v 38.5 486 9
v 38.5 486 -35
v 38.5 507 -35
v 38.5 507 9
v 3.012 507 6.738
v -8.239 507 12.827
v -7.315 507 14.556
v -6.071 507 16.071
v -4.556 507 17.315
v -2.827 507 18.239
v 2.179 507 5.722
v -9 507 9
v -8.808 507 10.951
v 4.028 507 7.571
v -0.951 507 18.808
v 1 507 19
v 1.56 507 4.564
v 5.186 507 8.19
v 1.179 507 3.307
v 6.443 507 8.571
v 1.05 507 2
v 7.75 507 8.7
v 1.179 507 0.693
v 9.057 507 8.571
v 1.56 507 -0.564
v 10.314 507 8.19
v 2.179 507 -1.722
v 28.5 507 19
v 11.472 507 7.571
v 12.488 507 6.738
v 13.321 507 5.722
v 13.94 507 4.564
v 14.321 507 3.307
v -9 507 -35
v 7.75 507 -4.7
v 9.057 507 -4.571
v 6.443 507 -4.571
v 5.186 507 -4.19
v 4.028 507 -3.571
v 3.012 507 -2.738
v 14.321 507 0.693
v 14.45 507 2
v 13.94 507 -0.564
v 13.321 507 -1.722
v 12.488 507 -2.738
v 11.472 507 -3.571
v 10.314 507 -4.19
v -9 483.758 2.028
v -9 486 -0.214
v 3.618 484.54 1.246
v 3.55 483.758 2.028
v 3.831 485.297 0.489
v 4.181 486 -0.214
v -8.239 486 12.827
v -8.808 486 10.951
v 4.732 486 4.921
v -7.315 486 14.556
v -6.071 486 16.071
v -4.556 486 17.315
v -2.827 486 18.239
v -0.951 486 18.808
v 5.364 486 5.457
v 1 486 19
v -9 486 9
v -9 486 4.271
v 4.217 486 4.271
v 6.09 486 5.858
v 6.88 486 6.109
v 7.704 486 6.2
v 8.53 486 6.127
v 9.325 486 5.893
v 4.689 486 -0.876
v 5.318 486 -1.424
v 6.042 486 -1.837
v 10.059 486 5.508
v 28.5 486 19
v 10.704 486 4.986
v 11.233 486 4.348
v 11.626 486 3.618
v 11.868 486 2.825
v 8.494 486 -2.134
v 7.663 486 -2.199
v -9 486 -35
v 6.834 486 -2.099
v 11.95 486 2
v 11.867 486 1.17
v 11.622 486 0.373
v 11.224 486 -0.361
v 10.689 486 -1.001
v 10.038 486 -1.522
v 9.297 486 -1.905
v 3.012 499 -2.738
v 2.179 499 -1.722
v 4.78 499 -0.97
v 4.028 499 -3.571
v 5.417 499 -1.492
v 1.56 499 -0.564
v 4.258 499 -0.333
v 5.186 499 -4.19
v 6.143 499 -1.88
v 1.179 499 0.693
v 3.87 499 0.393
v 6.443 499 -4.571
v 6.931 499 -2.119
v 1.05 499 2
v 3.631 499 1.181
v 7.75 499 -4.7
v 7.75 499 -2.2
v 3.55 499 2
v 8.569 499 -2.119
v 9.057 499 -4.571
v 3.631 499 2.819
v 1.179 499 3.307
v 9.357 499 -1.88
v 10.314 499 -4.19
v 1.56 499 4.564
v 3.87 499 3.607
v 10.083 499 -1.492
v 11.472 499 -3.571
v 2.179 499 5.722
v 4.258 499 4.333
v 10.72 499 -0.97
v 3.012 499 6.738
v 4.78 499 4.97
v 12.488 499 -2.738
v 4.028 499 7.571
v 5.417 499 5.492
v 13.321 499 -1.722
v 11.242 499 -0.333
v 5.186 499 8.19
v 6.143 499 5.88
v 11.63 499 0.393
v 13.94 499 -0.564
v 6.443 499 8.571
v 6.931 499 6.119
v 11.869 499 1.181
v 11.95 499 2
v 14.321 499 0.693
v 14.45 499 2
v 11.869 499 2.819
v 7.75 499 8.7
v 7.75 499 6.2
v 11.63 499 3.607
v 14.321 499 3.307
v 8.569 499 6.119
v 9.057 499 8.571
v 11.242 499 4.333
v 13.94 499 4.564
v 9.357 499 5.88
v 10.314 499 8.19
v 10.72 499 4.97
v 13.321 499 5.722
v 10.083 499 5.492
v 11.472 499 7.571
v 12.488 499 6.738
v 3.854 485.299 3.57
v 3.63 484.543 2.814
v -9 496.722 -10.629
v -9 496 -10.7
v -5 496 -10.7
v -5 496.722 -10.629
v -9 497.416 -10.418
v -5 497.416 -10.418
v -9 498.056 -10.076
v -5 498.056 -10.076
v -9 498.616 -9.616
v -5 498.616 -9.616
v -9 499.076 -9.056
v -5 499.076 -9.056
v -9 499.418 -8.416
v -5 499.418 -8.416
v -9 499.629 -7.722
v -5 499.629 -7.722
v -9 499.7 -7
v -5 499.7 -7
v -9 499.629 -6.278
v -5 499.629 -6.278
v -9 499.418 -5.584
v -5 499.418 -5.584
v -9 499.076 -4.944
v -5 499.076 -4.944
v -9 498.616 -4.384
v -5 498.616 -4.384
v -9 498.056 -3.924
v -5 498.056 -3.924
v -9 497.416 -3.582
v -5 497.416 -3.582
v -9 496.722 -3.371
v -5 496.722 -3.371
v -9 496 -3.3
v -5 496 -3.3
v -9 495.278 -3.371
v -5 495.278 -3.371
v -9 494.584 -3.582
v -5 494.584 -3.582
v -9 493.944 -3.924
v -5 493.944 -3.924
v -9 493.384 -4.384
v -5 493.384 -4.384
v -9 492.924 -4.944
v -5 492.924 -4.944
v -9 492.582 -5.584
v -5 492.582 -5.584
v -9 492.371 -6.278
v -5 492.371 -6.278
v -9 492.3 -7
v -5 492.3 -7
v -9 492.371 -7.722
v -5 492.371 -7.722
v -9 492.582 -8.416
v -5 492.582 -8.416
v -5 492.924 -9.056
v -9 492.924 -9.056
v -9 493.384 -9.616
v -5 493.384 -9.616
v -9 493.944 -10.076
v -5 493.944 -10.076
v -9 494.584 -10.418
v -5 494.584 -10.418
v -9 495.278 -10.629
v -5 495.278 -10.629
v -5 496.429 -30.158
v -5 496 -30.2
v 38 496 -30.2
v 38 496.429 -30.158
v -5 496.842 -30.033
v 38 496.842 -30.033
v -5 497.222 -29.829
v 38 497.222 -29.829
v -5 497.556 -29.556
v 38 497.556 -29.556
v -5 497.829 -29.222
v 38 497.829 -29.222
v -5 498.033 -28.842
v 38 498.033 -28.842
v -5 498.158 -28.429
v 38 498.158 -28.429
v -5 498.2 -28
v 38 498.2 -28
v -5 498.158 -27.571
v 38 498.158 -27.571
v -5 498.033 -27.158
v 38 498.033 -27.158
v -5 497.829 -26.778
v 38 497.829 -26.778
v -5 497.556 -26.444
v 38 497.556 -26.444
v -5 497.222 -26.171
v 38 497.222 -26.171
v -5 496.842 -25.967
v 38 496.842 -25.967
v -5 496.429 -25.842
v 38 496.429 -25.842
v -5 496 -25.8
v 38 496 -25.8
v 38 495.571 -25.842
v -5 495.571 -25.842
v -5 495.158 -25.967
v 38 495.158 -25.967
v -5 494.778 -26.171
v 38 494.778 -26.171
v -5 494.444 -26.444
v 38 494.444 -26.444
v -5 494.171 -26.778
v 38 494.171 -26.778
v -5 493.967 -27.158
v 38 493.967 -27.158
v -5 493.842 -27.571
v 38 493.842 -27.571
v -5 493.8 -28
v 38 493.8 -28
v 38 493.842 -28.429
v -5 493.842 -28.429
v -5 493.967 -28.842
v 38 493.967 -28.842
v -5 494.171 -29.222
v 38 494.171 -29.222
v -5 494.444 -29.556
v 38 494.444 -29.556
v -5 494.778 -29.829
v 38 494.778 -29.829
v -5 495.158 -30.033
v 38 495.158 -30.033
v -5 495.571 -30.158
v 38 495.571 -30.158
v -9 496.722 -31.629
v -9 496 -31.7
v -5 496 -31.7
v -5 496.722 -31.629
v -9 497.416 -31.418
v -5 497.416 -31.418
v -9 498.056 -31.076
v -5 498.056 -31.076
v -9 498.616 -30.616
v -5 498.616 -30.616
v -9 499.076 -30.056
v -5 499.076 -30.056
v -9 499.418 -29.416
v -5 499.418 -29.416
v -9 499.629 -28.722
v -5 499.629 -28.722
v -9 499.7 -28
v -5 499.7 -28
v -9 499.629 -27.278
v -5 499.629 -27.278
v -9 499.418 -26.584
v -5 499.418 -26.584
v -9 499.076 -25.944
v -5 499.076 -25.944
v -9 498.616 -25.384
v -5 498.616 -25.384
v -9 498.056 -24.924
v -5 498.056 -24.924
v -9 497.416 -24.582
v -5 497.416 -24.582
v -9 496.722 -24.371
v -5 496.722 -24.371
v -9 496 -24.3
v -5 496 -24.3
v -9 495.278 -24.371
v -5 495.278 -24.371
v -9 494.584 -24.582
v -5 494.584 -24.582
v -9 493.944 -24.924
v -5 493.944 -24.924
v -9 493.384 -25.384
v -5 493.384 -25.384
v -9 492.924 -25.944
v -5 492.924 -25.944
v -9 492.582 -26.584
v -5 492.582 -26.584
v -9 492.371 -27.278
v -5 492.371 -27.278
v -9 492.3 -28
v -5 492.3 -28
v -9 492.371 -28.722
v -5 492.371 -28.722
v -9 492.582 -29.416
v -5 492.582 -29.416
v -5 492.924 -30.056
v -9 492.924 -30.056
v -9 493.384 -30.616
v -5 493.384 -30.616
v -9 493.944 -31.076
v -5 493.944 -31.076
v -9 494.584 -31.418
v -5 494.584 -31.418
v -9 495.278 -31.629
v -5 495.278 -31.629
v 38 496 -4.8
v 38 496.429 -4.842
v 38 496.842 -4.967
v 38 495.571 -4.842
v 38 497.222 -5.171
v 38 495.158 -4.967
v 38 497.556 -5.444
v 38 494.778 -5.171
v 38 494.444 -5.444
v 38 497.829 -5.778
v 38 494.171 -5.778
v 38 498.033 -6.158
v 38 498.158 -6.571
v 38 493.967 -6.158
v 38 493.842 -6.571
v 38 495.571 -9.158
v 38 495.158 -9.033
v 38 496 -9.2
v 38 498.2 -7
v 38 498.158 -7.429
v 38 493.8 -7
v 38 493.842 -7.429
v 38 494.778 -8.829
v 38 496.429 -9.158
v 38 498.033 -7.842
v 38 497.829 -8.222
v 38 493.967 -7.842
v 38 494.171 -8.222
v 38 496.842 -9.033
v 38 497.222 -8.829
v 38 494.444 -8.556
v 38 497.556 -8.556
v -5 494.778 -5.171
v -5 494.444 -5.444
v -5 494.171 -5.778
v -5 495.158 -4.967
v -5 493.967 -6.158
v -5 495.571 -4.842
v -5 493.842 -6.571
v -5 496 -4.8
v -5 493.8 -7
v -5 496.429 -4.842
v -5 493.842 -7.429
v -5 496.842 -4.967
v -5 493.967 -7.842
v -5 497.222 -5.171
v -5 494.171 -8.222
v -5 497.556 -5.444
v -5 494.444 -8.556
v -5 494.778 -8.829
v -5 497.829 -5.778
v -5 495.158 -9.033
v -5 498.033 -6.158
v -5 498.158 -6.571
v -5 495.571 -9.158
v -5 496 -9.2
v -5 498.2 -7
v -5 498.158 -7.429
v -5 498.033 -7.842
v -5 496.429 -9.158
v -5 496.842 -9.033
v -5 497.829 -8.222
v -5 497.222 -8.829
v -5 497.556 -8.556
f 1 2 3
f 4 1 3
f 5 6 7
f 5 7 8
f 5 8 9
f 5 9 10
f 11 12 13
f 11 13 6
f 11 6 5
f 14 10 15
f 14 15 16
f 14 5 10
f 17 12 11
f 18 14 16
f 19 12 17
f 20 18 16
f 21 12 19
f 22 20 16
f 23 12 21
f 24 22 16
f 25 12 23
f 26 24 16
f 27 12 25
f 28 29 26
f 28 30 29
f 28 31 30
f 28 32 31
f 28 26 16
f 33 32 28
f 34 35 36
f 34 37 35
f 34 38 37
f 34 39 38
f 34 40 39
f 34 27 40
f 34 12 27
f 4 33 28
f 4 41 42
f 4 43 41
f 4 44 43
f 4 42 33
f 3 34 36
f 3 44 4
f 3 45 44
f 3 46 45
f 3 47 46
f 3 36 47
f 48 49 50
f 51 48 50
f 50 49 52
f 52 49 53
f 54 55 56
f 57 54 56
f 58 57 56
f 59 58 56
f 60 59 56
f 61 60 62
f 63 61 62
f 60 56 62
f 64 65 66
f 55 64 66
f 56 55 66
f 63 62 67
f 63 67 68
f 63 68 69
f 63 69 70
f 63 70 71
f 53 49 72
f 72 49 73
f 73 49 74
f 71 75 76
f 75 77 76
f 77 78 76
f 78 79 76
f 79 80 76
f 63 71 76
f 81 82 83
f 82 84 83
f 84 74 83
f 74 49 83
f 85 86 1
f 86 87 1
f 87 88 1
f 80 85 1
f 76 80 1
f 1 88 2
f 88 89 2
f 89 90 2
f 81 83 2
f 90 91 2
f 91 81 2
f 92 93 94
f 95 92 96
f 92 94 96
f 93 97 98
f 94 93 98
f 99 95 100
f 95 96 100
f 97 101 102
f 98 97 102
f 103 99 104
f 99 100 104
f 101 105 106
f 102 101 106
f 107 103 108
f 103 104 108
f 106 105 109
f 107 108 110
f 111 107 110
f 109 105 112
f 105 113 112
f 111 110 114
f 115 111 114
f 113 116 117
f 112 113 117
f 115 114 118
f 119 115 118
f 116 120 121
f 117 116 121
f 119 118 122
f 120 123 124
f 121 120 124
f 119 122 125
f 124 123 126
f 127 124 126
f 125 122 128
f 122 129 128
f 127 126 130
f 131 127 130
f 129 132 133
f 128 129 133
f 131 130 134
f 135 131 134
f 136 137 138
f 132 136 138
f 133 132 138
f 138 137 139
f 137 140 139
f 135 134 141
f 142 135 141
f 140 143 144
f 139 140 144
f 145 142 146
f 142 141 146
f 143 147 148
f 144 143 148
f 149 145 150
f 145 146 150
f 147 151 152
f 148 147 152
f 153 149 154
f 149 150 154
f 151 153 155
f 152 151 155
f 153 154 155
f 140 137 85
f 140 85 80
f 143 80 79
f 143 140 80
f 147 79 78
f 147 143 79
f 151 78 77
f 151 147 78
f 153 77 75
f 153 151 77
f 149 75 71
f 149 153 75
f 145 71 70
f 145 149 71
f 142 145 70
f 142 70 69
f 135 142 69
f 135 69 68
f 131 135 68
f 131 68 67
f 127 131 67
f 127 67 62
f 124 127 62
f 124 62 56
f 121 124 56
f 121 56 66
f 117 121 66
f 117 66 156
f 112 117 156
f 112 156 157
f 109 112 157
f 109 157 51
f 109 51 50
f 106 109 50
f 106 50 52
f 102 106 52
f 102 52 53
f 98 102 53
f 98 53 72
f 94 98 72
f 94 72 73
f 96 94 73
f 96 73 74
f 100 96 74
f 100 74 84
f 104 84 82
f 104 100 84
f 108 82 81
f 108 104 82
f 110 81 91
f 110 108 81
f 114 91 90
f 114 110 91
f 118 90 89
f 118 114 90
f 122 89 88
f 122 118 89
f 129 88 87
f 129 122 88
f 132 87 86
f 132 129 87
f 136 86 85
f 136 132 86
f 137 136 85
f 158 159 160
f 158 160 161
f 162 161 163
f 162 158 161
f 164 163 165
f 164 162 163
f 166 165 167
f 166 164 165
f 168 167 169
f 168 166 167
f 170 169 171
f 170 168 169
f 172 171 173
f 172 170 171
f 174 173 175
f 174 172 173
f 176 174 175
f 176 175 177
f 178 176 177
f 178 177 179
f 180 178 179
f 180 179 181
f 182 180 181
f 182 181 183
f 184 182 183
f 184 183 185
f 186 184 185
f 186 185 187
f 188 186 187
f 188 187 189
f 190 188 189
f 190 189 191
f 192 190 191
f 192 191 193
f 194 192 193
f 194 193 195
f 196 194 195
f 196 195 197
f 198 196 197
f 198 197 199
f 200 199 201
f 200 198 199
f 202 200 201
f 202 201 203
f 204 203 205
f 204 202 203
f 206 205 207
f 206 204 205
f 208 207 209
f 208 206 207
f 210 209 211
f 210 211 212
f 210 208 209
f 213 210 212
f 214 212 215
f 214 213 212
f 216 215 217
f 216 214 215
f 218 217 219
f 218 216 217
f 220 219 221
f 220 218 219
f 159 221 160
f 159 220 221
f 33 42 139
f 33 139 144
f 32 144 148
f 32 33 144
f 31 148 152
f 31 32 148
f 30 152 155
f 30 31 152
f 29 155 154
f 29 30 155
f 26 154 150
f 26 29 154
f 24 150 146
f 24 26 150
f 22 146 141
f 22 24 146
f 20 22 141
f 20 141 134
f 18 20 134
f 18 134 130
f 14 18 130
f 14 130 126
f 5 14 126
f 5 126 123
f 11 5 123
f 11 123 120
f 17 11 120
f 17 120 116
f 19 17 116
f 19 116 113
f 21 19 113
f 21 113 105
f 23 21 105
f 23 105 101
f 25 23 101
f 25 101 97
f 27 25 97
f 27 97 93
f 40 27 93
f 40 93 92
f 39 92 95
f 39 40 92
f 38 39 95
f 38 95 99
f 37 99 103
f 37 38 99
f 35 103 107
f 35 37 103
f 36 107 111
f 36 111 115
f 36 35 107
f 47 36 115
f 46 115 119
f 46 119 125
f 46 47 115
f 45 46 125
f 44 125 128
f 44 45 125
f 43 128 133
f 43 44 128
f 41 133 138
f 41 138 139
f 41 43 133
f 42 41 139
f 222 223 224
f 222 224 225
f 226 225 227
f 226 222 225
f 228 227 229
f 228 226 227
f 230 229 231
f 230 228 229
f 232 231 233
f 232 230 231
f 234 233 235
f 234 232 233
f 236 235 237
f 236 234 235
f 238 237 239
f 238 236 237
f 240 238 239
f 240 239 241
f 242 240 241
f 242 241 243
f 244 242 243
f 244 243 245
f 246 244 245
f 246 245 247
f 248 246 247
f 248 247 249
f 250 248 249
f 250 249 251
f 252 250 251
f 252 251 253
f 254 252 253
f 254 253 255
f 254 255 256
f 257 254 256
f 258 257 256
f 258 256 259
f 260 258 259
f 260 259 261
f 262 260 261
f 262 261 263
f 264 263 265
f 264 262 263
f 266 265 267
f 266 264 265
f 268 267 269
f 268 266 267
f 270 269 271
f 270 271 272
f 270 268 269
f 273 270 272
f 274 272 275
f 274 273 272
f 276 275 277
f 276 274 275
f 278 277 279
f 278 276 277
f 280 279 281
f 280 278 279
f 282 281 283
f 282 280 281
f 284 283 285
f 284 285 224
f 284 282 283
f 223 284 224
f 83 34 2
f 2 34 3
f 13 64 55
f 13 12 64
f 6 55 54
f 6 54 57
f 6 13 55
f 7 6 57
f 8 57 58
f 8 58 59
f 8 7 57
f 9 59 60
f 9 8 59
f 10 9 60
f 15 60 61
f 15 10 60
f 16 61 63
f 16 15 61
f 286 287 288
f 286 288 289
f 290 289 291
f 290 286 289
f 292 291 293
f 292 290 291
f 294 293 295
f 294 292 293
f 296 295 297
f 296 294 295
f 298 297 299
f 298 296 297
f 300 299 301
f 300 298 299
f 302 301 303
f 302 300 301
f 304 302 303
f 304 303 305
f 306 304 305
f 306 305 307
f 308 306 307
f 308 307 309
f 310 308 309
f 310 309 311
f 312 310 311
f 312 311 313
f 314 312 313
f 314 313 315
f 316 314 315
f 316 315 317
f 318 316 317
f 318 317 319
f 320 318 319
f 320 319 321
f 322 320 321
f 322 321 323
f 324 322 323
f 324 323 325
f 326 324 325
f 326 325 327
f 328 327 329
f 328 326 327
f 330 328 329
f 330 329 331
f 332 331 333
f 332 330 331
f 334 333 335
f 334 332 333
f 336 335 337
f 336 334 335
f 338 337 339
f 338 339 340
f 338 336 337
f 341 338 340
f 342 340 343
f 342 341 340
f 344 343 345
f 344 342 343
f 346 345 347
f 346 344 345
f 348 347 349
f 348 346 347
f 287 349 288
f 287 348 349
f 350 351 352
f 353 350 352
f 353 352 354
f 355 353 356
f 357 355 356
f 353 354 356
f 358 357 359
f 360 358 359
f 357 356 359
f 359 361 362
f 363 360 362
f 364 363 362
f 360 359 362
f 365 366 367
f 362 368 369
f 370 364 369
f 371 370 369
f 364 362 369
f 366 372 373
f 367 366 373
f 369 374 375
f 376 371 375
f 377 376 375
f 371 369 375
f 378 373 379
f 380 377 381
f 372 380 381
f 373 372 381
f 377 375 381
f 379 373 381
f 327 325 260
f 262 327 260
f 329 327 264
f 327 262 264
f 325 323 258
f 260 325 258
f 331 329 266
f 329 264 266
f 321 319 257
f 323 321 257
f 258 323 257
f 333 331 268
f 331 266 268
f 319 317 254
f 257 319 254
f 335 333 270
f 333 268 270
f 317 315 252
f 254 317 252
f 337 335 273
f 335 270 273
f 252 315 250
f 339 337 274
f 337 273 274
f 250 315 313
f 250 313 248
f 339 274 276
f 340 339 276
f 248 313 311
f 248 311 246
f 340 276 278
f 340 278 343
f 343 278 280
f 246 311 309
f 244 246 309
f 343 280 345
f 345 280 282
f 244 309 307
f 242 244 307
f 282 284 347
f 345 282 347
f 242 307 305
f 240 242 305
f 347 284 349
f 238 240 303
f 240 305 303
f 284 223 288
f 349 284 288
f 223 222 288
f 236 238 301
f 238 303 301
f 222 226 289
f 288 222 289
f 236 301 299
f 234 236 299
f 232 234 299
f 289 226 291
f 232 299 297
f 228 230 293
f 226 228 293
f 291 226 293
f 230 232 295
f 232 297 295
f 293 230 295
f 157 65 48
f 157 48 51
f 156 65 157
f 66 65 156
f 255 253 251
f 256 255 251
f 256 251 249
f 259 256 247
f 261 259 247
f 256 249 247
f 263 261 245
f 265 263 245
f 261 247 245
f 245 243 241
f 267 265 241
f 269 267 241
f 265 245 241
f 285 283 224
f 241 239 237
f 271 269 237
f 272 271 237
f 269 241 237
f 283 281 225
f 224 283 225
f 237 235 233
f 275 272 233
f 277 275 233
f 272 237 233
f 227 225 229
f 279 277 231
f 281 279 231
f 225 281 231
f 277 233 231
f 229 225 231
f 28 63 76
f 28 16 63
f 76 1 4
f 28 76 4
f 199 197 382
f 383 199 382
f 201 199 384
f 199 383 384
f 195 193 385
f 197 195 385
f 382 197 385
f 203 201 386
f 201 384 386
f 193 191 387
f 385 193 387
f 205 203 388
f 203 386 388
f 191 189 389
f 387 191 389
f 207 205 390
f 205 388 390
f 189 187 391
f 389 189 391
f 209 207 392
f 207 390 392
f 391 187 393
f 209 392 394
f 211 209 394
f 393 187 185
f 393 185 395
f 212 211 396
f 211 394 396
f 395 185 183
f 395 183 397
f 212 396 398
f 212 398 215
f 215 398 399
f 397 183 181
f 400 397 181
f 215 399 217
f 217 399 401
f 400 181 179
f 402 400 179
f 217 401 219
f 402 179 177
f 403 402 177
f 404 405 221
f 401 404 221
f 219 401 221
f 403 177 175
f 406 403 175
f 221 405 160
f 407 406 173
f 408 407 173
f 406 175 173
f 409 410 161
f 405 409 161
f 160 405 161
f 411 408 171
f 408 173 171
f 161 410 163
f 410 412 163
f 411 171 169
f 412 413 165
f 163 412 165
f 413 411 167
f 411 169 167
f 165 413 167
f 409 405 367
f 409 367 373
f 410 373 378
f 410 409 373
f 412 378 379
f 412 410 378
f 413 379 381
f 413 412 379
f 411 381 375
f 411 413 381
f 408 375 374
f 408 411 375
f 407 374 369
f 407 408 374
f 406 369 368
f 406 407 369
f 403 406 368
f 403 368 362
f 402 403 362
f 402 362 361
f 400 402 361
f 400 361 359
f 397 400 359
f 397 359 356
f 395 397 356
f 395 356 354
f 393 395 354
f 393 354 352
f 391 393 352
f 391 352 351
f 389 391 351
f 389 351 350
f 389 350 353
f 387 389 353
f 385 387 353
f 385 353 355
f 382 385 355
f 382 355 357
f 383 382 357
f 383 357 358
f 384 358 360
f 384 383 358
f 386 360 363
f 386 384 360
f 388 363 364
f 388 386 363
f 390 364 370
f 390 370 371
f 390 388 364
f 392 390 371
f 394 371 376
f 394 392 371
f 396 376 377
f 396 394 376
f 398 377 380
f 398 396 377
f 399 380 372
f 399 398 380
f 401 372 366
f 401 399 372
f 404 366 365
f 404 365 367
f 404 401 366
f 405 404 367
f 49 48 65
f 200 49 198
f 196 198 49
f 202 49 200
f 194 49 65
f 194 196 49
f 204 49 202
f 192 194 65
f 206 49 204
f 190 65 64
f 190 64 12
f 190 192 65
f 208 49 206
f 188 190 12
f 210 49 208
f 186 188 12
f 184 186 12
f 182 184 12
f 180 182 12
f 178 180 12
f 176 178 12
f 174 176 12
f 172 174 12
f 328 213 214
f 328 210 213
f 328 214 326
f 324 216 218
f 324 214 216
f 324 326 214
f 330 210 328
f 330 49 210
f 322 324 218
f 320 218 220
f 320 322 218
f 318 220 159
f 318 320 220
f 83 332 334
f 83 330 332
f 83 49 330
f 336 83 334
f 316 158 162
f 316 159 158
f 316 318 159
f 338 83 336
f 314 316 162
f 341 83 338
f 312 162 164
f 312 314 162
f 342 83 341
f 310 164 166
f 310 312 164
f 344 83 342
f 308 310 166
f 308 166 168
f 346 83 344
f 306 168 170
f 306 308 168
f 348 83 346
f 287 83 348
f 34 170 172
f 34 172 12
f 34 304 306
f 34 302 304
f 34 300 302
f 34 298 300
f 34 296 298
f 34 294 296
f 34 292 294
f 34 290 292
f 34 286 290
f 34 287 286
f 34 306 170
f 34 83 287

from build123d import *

# Parameters (mm, degrees)
CYLINDER013_R           = 3.7
CYLINDER013_DEPTH       = 10
CYLINDER013_PITCH_ANGLE = 90
CYLINDER012_R           = 2.2
CYLINDER012_DEPTH       = 50
CYLINDER012_PITCH_ANGLE = 90
CYLINDER011_R           = 6.7
CYLINDER011_DEPTH       = 70
CYLINDER011_ROLL_ANGLE  = 90
CYLINDER010_R           = 4.2
CYLINDER010_DEPTH       = 70
CYLINDER010_ROLL_ANGLE  = 90
BOX005009006_W          = 17
BOX005009006_H          = 4
BOX005009006_DEPTH      = 4
BOX005009006_ROLL_ANGLE = 45
BOX005007_W             = 47.5
BOX005007_H             = 21
BOX005007_DEPTH         = 54
FILLET002_R             = 10
CHAMFER007_SIZE         = 10


with BuildPart() as cylinder012:
    # Cylinder013 → Cylinder013 (new body)
    with BuildSketch(Plane.XY):
        Circle(CYLINDER013_R)
    extrude(amount=CYLINDER013_DEPTH)


with BuildPart() as cylinder012_1:
    # Cylinder013 pitch: moved
    add(cylinder012.part.rotate(Axis((0, 0, 0), (0, 1, 0)), CYLINDER013_PITCH_ANGLE))


with BuildPart() as cylinder012_2:
    # Cylinder013 placement: moved
    add(cylinder012_1.part.moved(Location((-15, 496, 2))))


with BuildPart() as cylinder:
    # Cylinder012 → Cylinder012 (new body)
    with BuildSketch(Plane.XY):
        Circle(CYLINDER012_R)
    extrude(amount=CYLINDER012_DEPTH)


with BuildPart() as cylinder_1:
    # Cylinder012 pitch: moved
    add(cylinder.part.rotate(Axis((0, 0, 0), (0, 1, 0)), CYLINDER012_PITCH_ANGLE))


with BuildPart() as cylinder_2:
    # Cylinder012 placement: moved
    add(cylinder_1.part.moved(Location((-12, 496, 2))))


with BuildPart() as m4_screw001:
    # Fusion006 base: copy of Cylinder
    add(cylinder_2.part)

    # Fusion006: union Cylinder012
    add(cylinder012_2.part)


with BuildPart() as m4_screw001_1:
    # Fusion006 placement: moved
    add(m4_screw001.part.moved(Location((0, 0, -9))))


with BuildPart() as fusion007:
    # Fusion005 base: copy of Cylinder
    add(cylinder_2.part)

    # Fusion005: union Cylinder012
    add(cylinder012_2.part)


with BuildPart() as fusion007_1:
    # Fusion005 placement: moved
    add(fusion007.part.moved(Location((0, 0, -30))))

    # Fusion007: union M4-screw001
    add(m4_screw001_1.part)


with BuildPart() as cylinder011:
    # Cylinder011 → Cylinder011 (new body)
    with BuildSketch(Plane.XY):
        Circle(CYLINDER011_R)
    extrude(amount=CYLINDER011_DEPTH)


with BuildPart() as cylinder011_1:
    # Cylinder011 roll: moved
    add(cylinder011.part.rotate(Axis((0, 0, 0), (1, 0, 0)), CYLINDER011_ROLL_ANGLE))


with BuildPart() as cylinder011_2:
    # Cylinder011 placement: moved
    add(cylinder011_1.part.moved(Location((7.75, 569, 2))))


with BuildPart() as cylinder010:
    # Cylinder010 → Cylinder010 (new body)
    with BuildSketch(Plane.XY):
        Circle(CYLINDER010_R)
    extrude(amount=CYLINDER010_DEPTH)


with BuildPart() as cylinder010_1:
    # Cylinder010 roll: moved
    add(cylinder010.part.rotate(Axis((0, 0, 0), (1, 0, 0)), CYLINDER010_ROLL_ANGLE))


with BuildPart() as cylinder010_2:
    # Cylinder010 placement: moved
    add(cylinder010_1.part.moved(Location((7.75, 531, 2))))


with BuildPart() as bracket_blank003:
    # Box005009006 → Box005009006 (new body)
    with BuildSketch(Plane.XY):
        with Locations((8.5, 2)):
            Rectangle(BOX005009006_W, BOX005009006_H)
    extrude(amount=BOX005009006_DEPTH)


with BuildPart() as bracket_blank003_1:
    # Box005009006 roll: moved
    add(bracket_blank003.part.rotate(Axis((0, 0, 0), (1, 0, 0)), BOX005009006_ROLL_ANGLE))


with BuildPart() as bracket_blank003_2:
    # Box005009006 placement: moved
    add(bracket_blank003_1.part.moved(Location((-9, 486.586, -0.8))))


with BuildPart() as bracket:
    # Box005007 → Box005007 (new body)
    with BuildSketch(Plane(origin=(-9, 486, -35), x_dir=(1, 0, 0), z_dir=(0, 0, 1))):
        with Locations((23.75, 10.5)):
            Rectangle(BOX005007_W, BOX005007_H)
    extrude(amount=BOX005007_DEPTH)

    # Fusion004: union bracket-blank003
    add(bracket_blank003_2.part)

    # Cut012: cut Cylinder010
    add(cylinder010_2.part, mode=Mode.SUBTRACT)

    # Cut013: cut Cylinder011
    add(cylinder011_2.part, mode=Mode.SUBTRACT)

    # Cut014: cut Fusion007
    add(fusion007_1.part, mode=Mode.SUBTRACT)

    # Fillet002
    fillet002_edges = [bracket.edges().sort_by_distance(p)[0] for p in [
        (-9, 496.5, 19),
    ]]
    fillet(fillet002_edges, radius=FILLET002_R)

    # Chamfer007
    chamfer007_edges = [bracket.edges().sort_by_distance(p)[0] for p in [
        (38.5, 496.5, 19),
    ]]
    chamfer(chamfer007_edges, length=CHAMFER007_SIZE)


solid = bracket.part
